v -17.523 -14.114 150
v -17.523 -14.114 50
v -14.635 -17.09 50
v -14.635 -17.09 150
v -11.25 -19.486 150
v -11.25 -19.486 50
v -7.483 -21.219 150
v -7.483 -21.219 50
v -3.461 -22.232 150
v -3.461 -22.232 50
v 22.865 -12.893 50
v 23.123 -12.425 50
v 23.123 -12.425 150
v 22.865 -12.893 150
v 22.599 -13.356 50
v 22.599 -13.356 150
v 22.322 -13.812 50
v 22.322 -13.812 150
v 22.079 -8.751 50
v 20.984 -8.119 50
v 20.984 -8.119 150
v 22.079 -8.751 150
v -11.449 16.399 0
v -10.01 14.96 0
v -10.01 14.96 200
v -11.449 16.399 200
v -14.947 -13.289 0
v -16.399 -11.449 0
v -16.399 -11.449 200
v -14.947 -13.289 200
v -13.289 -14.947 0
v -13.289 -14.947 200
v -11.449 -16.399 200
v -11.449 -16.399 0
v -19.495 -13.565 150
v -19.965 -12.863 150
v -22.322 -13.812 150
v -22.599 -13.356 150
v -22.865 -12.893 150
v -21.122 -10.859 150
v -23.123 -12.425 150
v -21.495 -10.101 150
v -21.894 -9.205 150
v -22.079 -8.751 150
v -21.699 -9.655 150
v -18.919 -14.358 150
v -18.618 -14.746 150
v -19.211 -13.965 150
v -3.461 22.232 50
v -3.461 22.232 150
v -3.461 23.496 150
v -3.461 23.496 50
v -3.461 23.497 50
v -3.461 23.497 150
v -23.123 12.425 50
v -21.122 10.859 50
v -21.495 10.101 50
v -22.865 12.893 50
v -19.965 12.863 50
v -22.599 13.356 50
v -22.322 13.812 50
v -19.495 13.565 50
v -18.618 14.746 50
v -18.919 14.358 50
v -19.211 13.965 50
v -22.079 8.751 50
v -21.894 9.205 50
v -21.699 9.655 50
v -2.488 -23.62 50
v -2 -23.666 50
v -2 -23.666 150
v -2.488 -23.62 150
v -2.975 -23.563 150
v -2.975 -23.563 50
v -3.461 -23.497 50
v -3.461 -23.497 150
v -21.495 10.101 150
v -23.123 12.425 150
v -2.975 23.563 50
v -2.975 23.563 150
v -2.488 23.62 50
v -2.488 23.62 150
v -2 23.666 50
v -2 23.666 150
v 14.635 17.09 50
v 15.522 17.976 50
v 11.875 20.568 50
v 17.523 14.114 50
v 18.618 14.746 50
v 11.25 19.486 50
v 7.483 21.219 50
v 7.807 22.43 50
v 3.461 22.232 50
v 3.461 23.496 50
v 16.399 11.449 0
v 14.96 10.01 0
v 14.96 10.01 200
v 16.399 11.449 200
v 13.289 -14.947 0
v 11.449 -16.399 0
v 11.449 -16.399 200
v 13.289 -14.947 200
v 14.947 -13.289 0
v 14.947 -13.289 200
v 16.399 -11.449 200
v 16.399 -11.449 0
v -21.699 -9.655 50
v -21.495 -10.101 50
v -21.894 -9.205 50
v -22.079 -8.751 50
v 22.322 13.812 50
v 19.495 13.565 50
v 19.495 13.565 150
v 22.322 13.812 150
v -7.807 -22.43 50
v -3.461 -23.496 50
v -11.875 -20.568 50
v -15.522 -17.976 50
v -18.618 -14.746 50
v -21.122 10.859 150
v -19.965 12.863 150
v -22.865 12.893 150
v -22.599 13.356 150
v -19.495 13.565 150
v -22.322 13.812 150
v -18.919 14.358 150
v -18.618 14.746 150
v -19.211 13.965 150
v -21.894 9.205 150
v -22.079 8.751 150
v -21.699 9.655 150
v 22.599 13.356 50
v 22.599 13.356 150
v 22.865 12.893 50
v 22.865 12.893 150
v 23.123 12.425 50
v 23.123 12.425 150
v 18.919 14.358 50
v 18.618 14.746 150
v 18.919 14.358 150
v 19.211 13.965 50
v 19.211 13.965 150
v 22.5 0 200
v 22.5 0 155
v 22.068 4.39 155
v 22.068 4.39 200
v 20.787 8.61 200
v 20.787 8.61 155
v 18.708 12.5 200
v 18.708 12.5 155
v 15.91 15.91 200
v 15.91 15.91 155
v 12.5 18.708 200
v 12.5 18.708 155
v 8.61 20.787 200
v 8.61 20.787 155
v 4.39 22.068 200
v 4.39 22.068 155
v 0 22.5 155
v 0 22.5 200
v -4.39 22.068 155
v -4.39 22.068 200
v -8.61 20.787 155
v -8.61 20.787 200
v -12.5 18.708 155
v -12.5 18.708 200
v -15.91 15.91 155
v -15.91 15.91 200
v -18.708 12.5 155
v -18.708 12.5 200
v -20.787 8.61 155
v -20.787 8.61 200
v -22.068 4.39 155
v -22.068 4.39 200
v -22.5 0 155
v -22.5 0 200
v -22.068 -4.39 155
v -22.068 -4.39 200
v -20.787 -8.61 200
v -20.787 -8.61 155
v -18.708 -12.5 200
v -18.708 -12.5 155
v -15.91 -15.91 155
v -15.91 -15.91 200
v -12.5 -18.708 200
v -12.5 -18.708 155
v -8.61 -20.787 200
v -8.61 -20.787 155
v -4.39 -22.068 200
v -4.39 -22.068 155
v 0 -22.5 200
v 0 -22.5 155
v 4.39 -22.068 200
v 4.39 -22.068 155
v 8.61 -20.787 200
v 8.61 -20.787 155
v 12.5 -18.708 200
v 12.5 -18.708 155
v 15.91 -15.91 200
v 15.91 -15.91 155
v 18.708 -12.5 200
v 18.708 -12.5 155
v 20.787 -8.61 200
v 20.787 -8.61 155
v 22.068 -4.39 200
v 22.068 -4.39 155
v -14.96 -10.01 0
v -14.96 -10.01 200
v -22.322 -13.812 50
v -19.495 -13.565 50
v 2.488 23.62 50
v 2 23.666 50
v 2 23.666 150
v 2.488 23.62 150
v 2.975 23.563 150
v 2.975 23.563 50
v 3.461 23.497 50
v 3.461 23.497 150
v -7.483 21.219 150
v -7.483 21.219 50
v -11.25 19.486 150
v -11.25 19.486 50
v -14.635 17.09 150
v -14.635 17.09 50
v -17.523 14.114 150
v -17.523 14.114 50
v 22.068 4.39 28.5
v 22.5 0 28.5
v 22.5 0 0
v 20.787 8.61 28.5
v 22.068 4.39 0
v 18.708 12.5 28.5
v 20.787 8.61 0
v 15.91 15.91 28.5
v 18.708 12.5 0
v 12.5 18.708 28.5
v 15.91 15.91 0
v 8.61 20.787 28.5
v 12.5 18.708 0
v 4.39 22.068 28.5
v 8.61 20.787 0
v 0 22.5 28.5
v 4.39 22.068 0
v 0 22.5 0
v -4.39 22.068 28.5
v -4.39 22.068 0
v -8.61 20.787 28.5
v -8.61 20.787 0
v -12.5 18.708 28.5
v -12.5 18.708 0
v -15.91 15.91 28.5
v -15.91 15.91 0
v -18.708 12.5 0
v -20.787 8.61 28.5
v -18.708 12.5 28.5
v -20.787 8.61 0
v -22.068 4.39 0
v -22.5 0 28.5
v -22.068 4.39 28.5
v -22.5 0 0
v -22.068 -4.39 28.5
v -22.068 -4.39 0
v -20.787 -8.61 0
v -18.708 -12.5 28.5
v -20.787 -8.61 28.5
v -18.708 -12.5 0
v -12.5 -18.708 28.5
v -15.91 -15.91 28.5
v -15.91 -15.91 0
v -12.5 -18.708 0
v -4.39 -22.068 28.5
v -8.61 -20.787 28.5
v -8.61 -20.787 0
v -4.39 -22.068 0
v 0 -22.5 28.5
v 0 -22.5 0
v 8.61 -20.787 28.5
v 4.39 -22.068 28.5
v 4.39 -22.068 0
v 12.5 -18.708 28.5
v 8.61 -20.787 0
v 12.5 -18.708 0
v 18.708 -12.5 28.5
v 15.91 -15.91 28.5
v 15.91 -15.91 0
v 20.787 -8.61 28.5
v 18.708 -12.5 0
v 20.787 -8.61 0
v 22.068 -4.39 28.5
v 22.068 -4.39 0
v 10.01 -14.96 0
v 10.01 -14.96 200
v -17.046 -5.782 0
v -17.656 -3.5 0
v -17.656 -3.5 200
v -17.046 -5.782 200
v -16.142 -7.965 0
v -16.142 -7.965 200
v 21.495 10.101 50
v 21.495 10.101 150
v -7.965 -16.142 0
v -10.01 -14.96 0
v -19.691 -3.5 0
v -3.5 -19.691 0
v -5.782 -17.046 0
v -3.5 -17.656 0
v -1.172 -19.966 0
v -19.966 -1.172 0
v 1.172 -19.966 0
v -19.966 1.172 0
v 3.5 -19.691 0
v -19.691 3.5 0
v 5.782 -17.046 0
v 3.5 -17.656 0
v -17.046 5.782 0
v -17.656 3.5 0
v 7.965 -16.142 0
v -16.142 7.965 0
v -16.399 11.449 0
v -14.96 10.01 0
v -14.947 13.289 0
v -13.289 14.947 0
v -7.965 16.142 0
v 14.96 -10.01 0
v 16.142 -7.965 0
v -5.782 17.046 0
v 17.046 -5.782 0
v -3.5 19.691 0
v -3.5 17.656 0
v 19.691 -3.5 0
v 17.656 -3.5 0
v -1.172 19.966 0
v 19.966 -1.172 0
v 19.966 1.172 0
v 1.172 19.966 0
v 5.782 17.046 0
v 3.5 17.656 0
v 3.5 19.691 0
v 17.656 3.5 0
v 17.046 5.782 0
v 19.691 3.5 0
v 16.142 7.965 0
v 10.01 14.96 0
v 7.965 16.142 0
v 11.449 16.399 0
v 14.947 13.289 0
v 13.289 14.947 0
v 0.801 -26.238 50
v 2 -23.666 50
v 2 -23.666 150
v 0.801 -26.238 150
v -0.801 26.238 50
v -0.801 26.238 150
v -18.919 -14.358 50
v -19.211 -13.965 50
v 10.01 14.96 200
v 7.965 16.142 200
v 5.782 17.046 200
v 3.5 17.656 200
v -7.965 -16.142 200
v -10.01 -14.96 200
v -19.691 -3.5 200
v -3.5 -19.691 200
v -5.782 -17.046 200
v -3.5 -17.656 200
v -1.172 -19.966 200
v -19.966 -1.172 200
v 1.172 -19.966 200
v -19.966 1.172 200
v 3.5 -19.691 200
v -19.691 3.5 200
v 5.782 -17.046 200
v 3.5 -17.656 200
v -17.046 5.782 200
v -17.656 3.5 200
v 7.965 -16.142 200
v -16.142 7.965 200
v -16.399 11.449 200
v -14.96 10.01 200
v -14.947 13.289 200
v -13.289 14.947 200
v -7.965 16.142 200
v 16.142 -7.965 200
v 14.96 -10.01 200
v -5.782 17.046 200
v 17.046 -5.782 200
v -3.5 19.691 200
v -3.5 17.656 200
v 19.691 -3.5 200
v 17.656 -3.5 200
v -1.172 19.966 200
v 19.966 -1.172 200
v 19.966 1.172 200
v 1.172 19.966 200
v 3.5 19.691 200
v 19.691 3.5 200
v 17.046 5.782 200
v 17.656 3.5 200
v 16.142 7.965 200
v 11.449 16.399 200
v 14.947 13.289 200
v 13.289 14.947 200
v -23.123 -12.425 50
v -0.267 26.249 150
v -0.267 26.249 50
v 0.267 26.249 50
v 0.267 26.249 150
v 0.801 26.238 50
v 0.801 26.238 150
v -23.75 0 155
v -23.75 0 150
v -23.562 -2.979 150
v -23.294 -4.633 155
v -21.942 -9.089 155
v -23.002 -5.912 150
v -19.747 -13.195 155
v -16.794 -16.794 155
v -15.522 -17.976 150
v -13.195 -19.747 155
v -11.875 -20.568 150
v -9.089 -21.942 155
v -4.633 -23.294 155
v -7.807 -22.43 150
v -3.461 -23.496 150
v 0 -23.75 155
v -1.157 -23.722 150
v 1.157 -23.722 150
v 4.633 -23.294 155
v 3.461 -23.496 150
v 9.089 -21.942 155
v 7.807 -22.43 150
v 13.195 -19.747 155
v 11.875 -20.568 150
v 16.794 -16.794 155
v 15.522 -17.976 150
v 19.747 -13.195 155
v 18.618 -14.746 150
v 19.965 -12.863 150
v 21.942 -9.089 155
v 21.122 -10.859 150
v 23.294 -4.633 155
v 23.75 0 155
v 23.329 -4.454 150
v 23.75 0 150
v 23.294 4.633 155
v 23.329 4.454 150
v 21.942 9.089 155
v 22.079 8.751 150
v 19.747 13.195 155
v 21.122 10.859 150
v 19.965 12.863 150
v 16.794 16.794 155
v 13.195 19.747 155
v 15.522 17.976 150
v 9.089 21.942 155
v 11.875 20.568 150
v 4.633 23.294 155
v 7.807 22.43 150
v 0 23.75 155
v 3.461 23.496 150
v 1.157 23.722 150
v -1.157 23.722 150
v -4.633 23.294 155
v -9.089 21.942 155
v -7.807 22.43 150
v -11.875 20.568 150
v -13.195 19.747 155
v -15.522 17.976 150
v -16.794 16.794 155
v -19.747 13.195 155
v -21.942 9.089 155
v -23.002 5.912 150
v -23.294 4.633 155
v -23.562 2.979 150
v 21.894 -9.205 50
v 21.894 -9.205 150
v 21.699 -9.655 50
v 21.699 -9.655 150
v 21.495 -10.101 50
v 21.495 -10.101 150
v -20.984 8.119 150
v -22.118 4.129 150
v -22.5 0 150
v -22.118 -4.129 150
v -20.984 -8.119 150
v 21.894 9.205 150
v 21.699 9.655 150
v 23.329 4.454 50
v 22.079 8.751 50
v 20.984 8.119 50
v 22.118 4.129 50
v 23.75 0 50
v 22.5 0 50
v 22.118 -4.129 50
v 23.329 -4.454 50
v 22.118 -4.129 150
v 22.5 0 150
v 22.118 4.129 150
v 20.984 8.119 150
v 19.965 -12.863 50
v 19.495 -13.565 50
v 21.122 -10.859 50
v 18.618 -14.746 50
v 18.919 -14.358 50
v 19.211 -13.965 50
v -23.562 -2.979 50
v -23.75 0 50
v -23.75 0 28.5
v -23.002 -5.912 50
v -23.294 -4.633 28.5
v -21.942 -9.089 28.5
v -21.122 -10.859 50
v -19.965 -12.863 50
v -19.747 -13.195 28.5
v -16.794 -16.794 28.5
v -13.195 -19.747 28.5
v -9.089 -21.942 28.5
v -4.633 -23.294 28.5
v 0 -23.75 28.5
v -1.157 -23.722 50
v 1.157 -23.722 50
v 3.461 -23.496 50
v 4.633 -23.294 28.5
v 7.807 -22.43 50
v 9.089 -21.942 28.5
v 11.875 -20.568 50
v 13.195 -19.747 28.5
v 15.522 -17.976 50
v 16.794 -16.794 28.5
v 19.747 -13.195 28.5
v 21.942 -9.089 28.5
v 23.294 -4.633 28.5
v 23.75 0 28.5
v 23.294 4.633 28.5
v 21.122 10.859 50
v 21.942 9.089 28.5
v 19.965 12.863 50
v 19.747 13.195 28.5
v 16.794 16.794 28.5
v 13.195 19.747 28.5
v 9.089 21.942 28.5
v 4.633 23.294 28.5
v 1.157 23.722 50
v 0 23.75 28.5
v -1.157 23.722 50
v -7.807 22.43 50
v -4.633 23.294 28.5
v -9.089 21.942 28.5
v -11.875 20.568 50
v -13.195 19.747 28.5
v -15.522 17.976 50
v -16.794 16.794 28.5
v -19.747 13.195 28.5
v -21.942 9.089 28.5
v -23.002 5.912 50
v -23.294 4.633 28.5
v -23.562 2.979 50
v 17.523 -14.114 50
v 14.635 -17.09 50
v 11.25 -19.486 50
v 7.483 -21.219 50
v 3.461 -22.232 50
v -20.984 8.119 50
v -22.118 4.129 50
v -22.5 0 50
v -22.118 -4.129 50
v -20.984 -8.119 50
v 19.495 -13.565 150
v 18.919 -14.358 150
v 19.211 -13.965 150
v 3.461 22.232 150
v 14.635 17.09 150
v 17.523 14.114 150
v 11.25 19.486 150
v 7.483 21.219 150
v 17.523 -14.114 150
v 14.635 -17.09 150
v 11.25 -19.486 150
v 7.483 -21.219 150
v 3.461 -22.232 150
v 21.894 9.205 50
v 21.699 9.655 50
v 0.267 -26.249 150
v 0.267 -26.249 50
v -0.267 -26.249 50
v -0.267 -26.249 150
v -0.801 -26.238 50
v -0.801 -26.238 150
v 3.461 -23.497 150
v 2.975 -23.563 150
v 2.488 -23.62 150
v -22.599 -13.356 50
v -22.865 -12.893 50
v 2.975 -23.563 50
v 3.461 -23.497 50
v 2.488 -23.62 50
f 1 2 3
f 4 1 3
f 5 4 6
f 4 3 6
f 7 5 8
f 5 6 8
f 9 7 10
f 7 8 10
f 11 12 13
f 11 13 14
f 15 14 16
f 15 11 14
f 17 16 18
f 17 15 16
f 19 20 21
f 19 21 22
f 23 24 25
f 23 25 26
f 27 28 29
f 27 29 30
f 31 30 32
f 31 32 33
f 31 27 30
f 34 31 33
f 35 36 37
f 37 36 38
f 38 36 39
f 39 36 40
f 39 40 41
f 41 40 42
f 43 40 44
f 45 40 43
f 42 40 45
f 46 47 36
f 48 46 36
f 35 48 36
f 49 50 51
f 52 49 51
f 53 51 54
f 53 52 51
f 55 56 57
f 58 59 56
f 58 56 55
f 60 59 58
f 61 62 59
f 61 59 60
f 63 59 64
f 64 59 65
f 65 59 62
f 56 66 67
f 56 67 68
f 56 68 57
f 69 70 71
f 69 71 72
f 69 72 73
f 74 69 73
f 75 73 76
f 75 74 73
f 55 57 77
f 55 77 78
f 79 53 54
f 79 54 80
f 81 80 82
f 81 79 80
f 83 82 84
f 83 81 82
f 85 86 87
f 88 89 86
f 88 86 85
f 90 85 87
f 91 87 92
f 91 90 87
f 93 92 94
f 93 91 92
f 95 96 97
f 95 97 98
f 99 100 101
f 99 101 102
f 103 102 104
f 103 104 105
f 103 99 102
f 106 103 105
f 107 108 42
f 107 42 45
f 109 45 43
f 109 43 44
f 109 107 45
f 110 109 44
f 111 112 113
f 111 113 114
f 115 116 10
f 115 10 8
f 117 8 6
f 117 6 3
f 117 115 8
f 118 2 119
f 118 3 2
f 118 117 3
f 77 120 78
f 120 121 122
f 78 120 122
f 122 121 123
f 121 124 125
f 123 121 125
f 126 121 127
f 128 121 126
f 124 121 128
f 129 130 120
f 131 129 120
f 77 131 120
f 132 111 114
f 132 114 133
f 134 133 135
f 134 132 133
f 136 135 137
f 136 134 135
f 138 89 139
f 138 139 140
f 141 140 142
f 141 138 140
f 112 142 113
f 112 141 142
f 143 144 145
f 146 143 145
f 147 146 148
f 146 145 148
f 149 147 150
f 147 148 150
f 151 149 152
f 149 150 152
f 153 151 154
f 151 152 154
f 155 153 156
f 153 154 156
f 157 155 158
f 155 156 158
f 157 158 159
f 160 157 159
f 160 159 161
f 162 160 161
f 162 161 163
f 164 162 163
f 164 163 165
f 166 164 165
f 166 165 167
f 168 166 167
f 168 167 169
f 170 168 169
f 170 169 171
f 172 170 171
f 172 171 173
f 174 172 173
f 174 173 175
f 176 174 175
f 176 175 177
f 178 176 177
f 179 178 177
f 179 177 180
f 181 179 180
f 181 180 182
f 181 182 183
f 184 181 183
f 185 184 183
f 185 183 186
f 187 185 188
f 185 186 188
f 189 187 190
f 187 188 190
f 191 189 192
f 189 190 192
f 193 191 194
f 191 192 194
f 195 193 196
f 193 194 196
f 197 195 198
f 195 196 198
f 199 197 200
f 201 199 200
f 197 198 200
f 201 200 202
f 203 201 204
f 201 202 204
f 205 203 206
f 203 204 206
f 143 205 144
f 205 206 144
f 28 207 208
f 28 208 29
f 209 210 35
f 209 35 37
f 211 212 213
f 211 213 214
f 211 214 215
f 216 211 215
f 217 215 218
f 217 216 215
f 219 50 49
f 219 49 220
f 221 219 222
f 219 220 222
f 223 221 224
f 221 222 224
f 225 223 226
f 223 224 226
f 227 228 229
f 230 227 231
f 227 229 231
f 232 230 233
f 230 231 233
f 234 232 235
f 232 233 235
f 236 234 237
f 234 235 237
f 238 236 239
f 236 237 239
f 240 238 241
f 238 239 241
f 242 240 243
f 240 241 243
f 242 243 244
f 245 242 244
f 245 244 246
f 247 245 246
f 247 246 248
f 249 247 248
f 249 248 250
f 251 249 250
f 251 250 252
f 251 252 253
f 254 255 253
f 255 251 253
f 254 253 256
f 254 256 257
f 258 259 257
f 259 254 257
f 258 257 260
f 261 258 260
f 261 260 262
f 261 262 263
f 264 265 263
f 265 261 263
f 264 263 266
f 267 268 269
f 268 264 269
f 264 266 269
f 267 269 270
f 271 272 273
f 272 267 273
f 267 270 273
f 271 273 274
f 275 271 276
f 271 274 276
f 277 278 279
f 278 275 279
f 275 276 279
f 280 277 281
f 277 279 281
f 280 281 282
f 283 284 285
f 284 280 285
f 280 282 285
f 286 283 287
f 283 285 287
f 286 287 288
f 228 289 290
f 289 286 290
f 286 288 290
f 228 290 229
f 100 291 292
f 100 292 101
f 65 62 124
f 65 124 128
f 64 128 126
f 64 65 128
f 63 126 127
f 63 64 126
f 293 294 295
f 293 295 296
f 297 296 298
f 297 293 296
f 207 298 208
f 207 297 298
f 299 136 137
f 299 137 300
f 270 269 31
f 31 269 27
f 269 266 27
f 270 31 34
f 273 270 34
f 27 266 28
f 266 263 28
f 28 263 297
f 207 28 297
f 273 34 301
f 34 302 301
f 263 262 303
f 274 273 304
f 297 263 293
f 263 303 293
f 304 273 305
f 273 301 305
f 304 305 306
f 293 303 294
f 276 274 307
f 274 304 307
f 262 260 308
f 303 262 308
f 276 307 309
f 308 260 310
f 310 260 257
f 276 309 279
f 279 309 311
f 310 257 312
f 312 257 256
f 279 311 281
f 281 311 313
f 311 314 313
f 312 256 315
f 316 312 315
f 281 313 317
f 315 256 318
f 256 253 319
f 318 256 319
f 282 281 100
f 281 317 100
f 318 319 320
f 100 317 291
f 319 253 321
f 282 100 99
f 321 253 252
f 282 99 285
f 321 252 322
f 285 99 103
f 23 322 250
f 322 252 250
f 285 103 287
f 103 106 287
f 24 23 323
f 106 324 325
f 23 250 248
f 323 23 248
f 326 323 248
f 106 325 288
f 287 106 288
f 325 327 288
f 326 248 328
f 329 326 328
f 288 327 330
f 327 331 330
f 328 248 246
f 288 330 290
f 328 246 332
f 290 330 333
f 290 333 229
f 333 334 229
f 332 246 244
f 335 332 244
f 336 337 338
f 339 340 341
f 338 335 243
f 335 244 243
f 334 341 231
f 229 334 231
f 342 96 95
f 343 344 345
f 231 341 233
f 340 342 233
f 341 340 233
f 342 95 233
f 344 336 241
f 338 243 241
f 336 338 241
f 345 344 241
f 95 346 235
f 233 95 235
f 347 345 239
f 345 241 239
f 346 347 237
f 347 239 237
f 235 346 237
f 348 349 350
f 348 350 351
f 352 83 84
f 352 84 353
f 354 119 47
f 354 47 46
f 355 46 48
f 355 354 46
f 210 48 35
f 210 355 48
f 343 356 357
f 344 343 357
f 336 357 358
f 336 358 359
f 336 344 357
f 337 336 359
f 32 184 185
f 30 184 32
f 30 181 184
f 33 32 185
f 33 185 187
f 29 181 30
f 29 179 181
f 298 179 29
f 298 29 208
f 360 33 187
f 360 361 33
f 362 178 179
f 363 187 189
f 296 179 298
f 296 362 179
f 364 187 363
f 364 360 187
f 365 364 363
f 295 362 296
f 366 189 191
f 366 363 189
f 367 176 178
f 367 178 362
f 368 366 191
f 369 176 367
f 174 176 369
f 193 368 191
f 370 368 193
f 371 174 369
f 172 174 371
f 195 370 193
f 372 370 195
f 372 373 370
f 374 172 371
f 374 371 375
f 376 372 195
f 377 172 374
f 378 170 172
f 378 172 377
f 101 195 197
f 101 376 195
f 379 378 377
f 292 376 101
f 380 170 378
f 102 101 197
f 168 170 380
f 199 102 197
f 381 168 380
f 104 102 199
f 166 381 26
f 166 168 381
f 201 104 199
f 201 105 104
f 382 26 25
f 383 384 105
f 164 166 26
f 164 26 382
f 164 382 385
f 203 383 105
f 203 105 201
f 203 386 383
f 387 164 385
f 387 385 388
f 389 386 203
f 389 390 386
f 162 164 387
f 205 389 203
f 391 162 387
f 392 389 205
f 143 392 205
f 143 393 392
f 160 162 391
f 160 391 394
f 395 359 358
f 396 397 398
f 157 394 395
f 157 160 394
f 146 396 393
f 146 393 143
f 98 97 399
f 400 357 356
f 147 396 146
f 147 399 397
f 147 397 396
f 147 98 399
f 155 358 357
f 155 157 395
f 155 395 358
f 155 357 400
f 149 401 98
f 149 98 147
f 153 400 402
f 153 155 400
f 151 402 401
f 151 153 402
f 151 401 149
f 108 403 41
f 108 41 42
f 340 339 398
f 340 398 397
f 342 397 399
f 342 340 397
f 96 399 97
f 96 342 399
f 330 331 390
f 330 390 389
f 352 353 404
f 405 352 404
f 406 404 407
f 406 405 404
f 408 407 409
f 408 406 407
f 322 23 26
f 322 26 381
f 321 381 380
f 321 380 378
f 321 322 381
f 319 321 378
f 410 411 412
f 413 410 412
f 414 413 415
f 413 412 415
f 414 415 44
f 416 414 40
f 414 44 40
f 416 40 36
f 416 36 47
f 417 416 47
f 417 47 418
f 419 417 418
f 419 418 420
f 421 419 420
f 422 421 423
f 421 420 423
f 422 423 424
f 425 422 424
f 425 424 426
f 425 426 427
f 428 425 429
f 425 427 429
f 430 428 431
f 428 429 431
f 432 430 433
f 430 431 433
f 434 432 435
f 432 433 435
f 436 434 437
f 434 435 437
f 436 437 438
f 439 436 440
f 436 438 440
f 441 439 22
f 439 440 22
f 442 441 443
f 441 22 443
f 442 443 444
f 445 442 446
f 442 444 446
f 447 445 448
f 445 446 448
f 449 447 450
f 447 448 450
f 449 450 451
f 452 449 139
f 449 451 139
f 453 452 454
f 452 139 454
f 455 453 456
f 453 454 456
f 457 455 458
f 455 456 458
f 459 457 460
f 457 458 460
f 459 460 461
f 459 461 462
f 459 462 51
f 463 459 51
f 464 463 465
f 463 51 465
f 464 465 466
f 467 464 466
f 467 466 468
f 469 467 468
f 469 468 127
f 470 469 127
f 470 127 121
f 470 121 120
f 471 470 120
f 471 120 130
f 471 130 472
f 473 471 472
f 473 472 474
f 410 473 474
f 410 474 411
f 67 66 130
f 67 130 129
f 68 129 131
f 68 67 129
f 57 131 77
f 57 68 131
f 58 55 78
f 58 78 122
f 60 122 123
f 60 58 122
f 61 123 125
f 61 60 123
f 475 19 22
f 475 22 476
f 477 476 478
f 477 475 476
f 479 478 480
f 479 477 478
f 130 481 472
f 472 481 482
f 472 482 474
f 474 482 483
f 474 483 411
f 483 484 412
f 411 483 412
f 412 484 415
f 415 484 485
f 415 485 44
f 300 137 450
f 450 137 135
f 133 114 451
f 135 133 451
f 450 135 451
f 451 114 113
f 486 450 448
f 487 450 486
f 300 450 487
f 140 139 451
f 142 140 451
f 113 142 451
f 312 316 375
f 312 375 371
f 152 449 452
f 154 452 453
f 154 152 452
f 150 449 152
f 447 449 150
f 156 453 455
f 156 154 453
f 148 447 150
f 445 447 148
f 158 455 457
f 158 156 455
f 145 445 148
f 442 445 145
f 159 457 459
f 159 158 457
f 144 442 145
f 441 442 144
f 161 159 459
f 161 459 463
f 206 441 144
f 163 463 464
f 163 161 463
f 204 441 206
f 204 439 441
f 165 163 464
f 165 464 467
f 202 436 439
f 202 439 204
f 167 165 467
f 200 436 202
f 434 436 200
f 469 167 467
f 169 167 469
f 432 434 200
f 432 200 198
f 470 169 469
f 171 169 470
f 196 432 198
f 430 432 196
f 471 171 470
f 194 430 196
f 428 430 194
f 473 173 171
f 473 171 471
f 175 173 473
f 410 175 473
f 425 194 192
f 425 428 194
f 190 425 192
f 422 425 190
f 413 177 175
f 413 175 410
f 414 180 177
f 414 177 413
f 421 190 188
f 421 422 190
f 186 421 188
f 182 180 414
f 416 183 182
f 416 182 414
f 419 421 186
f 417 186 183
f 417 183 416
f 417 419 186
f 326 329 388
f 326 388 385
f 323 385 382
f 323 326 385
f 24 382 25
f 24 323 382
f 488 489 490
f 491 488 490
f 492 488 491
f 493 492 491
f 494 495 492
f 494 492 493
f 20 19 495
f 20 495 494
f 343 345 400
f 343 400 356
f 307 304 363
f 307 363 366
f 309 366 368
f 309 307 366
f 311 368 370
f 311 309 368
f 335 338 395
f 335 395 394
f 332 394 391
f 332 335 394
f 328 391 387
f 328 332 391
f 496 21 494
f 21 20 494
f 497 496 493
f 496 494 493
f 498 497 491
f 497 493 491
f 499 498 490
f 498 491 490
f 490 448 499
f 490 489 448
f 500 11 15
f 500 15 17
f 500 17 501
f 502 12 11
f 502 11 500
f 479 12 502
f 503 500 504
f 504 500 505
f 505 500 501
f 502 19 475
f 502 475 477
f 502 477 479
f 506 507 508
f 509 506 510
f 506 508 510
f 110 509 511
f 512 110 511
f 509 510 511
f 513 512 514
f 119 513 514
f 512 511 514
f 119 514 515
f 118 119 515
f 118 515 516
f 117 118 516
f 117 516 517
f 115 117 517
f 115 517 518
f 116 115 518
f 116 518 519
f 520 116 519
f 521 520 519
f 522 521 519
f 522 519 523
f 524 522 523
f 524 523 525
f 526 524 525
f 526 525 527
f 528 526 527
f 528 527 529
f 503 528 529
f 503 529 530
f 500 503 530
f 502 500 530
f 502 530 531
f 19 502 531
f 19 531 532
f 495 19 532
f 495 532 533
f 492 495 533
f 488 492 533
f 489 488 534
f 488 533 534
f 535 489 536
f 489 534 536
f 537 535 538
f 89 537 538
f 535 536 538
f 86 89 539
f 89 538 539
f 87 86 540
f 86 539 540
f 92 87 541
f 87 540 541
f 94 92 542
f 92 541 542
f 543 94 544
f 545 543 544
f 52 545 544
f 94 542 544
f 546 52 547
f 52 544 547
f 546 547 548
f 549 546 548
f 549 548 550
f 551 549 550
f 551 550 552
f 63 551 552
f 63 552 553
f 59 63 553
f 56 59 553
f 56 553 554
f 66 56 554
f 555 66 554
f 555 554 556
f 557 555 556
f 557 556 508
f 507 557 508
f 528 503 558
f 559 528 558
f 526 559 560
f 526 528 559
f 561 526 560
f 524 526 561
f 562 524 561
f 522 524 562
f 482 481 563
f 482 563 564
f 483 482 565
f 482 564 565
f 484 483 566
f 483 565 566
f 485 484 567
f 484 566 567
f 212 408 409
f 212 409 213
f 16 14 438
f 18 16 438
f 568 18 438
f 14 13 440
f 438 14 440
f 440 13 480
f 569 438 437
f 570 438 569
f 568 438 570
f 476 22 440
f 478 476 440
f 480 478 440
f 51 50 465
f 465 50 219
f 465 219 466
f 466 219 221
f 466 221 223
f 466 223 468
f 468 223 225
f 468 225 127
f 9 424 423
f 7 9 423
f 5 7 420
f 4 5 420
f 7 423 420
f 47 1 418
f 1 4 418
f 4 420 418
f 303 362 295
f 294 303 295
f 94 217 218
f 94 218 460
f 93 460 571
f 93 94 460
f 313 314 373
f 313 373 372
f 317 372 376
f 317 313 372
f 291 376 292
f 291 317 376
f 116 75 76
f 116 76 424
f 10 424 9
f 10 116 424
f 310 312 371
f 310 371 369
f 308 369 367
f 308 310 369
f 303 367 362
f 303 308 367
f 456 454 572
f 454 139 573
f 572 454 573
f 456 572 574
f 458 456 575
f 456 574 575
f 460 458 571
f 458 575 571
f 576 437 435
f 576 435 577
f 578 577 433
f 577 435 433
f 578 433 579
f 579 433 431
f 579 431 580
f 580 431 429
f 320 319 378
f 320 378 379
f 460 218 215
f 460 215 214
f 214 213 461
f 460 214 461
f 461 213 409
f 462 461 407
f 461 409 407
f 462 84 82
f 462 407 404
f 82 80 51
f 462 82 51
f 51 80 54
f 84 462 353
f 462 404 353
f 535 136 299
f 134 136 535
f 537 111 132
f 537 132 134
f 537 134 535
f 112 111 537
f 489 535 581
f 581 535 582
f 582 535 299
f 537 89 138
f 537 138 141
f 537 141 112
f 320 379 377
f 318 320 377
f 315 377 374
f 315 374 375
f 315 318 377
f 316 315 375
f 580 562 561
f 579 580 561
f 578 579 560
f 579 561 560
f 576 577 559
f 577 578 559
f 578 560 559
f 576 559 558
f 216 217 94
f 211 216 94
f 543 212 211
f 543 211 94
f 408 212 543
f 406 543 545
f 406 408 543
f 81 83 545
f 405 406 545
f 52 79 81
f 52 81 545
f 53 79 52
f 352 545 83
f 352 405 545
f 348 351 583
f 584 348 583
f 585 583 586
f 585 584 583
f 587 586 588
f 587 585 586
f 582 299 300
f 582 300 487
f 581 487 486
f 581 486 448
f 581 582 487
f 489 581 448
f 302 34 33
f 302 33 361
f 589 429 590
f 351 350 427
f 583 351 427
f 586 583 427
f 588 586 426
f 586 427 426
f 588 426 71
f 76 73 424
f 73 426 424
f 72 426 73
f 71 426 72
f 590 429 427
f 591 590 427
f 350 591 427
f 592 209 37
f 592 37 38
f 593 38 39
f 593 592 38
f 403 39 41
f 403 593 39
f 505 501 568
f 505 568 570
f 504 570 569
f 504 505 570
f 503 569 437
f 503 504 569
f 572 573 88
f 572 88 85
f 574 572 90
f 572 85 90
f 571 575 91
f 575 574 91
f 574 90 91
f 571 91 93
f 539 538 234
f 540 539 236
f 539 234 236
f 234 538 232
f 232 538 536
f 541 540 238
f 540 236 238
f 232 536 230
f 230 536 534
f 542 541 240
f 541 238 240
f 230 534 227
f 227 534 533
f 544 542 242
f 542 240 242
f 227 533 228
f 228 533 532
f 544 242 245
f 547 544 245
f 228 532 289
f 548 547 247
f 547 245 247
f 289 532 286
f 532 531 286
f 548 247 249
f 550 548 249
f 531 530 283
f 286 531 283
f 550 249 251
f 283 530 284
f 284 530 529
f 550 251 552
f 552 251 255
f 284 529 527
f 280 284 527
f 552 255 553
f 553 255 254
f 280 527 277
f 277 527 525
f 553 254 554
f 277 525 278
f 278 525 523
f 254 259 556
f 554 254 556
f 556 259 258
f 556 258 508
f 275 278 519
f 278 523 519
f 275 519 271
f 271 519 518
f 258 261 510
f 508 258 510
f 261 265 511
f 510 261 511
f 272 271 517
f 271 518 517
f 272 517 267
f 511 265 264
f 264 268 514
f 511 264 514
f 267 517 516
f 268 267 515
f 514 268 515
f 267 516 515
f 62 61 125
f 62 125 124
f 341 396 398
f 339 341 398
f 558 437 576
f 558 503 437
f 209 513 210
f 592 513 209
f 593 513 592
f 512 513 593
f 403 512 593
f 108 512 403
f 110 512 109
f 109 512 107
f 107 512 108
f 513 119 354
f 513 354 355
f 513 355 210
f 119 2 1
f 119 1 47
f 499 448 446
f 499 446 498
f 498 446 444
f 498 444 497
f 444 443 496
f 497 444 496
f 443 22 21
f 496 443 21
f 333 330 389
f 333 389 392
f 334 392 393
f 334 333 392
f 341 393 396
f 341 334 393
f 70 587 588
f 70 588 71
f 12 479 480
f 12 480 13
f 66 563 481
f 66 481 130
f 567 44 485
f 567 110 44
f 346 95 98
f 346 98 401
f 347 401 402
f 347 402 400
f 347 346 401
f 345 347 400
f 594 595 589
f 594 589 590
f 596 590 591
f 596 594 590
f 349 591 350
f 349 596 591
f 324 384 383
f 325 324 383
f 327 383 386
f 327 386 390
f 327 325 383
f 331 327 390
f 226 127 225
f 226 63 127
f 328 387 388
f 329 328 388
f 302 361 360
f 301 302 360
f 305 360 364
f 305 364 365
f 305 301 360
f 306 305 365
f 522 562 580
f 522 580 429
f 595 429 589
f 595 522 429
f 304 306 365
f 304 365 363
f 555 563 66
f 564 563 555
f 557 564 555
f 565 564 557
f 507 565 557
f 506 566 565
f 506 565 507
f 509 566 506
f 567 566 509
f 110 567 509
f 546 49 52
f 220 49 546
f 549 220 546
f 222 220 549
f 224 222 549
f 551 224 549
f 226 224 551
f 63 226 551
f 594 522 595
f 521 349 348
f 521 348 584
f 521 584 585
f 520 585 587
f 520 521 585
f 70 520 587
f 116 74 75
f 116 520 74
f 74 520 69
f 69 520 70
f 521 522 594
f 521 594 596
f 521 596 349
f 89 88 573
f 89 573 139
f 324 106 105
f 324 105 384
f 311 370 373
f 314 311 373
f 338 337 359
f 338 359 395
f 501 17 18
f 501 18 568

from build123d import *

# Parameters (mm, degrees)
SKETCH1_R           = 22.5
BOSS_EXTRUDE1_DEPTH = 200
BOSS_EXTRUDE2_START = 50
BOSS_EXTRUDE2_DEPTH = 100
BOSS_EXTRUDE3_START = -50
SKETCH4_R           = 23.75
SKETCH4_R_2         = 22.25
BOSS_EXTRUDE3_DEPTH = 5
BOSS_EXTRUDE4_START = -171.5
SKETCH4_2_R         = 23.75
SKETCH4_2_R_2       = 22.25
BOSS_EXTRUDE4_DEPTH = 21.5


with BuildPart() as part:
    # Sketch1 → Boss-Extrude1 (new body)
    with BuildSketch(Plane.XY):
        Circle(SKETCH1_R)
        with BuildLine():
            Line((-3.5, 19.691368668), (-3.5, 17.656443583))
            ThreePointArc((-3.5, 17.656443583), (-6.888301783, 16.629831585), (-10.010117255, 14.959864723))
            Line((-10.010117255, 14.959864723), (-11.449026581, 16.39877405))
            ThreePointArc((-11.449026581, 16.39877405), (-14.142135624, 14.142135624), (-16.39877405, 11.449026581))
            Line((-16.39877405, 11.449026581), (-14.959864723, 10.010117255))
            ThreePointArc((-14.959864723, 10.010117255), (-16.629831585, 6.888301783), (-17.656443583, 3.5))
            Line((-17.656443583, 3.5), (-19.691368668, 3.5))
            ThreePointArc((-19.691368668, 3.5), (-20, 0), (-19.691368668, -3.5))
            Line((-19.691368668, -3.5), (-17.656443583, -3.5))
            ThreePointArc((-17.656443583, -3.5), (-16.629831585, -6.888301783), (-14.959864723, -10.010117255))
            Line((-14.959864723, -10.010117255), (-16.39877405, -11.449026581))
            ThreePointArc((-16.39877405, -11.449026581), (-14.142135624, -14.142135624), (-11.449026581, -16.39877405))
            Line((-11.449026581, -16.39877405), (-10.010117255, -14.959864723))
            ThreePointArc((-10.010117255, -14.959864723), (-6.888301783, -16.629831585), (-3.5, -17.656443583))
            Line((-3.5, -17.656443583), (-3.5, -19.691368668))
            ThreePointArc((-3.5, -19.691368668), (0, -20), (3.5, -19.691368668))
            Line((3.5, -19.691368668), (3.5, -17.656443583))
            ThreePointArc((3.5, -17.656443583), (6.888301783, -16.629831585), (10.010117255, -14.959864723))
            Line((10.010117255, -14.959864723), (11.449026581, -16.39877405))
            ThreePointArc((11.449026581, -16.39877405), (14.142135624, -14.142135624), (16.39877405, -11.449026581))
            Line((16.39877405, -11.449026581), (14.959864723, -10.010117255))
            ThreePointArc((14.959864723, -10.010117255), (16.629831585, -6.888301783), (17.656443583, -3.5))
            Line((17.656443583, -3.5), (19.691368668, -3.5))
            ThreePointArc((19.691368668, -3.5), (20, 0), (19.691368668, 3.5))
            Line((19.691368668, 3.5), (17.656443583, 3.5))
            ThreePointArc((17.656443583, 3.5), (16.629831585, 6.888301783), (14.959864723, 10.010117255))
            Line((14.959864723, 10.010117255), (16.39877405, 11.449026581))
            ThreePointArc((16.39877405, 11.449026581), (14.142135624, 14.142135624), (11.449026581, 16.39877405))
            Line((11.449026581, 16.39877405), (10.010117255, 14.959864723))
            ThreePointArc((10.010117255, 14.959864723), (6.888301783, 16.629831585), (3.5, 17.656443583))
            Line((3.5, 17.656443583), (3.5, 19.691368668))
            ThreePointArc((3.5, 19.691368668), (0, 20), (-3.5, 19.691368668))
        make_face(mode=Mode.SUBTRACT)
    extrude(amount=BOSS_EXTRUDE1_DEPTH)

    # Sketch3 → Boss-Extrude2 (add)
    with BuildSketch(Plane.XY.offset(BOSS_EXTRUDE2_START)):
        with BuildLine():
            Line((-2.000027302, 23.665962711), (-0.80077241, 26.237773126))
            ThreePointArc((-0.80077241, 26.237773126), (0, 26.249990002), (0.80077241, 26.237773126))
            Line((0.80077241, 26.237773126), (2.000027302, 23.665962711))
            ThreePointArc((2.000027302, 23.665962711), (2.731879206, 23.592683956), (3.461111111, 23.496778718))
            Line((3.461111111, 23.496778718), (3.461111111, 21.979153985))
            ThreePointArc((3.461111111, 21.979153985), (0, 22.25), (-3.461111111, 21.979153985))
            Line((-3.461111111, 21.979153985), (-3.461111111, 23.496778718))
            ThreePointArc((-3.461111111, 23.496778718), (-2.731879206, 23.592683956), (-2.000027302, 23.665962711))
        make_face()
        with BuildLine():
            Line((17.303950149, 13.98698714), (18.618251721, 14.745799506))
            ThreePointArc((18.618251721, 14.745799506), (19.065924046, 14.162218771), (19.495311261, 13.565055807))
            Line((19.495311261, 13.565055807), (22.322191861, 13.812375813))
            ThreePointArc((22.322191861, 13.812375813), (22.73315819, 13.124995001), (23.122964271, 12.425397313))
            Line((23.122964271, 12.425397313), (21.495338563, 10.100906903))
            ThreePointArc((21.495338563, 10.100906903), (21.797803252, 9.430465185), (22.079362832, 8.750979211))
            Line((22.079362832, 8.750979211), (20.76506126, 7.992166845))
            ThreePointArc((20.76506126, 7.992166845), (19.269065234, 11.125), (17.303950149, 13.98698714))
        make_face()
        with BuildLine():
            Line((20.76506126, -7.992166845), (22.079362832, -8.750979211))
            ThreePointArc((22.079362832, -8.750979211), (21.797803252, -9.430465185), (21.495338563, -10.100906903))
            Line((21.495338563, -10.100906903), (23.122964271, -12.425397313))
            ThreePointArc((23.122964271, -12.425397313), (22.73315819, -13.124995001), (22.322191861, -13.812375813))
            Line((22.322191861, -13.812375813), (19.495311261, -13.565055807))
            ThreePointArc((19.495311261, -13.565055807), (19.065924046, -14.162218771), (18.618251721, -14.745799506))
            Line((18.618251721, -14.745799506), (17.303950149, -13.98698714))
            ThreePointArc((17.303950149, -13.98698714), (19.269065234, -11.125), (20.76506126, -7.992166845))
        make_face()
        with BuildLine():
            Line((3.461111111, -21.979153985), (3.461111111, -23.496778718))
            ThreePointArc((3.461111111, -23.496778718), (2.731879206, -23.592683956), (2.000027302, -23.665962711))
            Line((2.000027302, -23.665962711), (0.80077241, -26.237773126))
            ThreePointArc((0.80077241, -26.237773126), (0, -26.249990002), (-0.80077241, -26.237773126))
            Line((-0.80077241, -26.237773126), (-2.000027302, -23.665962711))
            ThreePointArc((-2.000027302, -23.665962711), (-2.731879206, -23.592683956), (-3.461111111, -23.496778718))
            Line((-3.461111111, -23.496778718), (-3.461111111, -21.979153985))
            ThreePointArc((-3.461111111, -21.979153985), (0, -22.25), (3.461111111, -21.979153985))
        make_face()
        with BuildLine():
            Line((-17.303950149, -13.98698714), (-18.618251721, -14.745799506))
            ThreePointArc((-18.618251721, -14.745799506), (-19.065924046, -14.162218771), (-19.495311261, -13.565055807))
            Line((-19.495311261, -13.565055807), (-22.322191861, -13.812375813))
            ThreePointArc((-22.322191861, -13.812375813), (-22.73315819, -13.124995001), (-23.122964271, -12.425397313))
            Line((-23.122964271, -12.425397313), (-21.495338563, -10.100906903))
            ThreePointArc((-21.495338563, -10.100906903), (-21.797803252, -9.430465185), (-22.079362832, -8.750979211))
            Line((-22.079362832, -8.750979211), (-20.76506126, -7.992166845))
            ThreePointArc((-20.76506126, -7.992166845), (-19.269065234, -11.125), (-17.303950149, -13.98698714))
        make_face()
        with BuildLine():
            Line((-20.76506126, 7.992166845), (-22.079362832, 8.750979211))
            ThreePointArc((-22.079362832, 8.750979211), (-21.797803252, 9.430465185), (-21.495338563, 10.100906903))
            Line((-21.495338563, 10.100906903), (-23.122964271, 12.425397313))
            ThreePointArc((-23.122964271, 12.425397313), (-22.73315819, 13.124995001), (-22.322191861, 13.812375813))
            Line((-22.322191861, 13.812375813), (-19.495311261, 13.565055807))
            ThreePointArc((-19.495311261, 13.565055807), (-19.065924046, 14.162218771), (-18.618251721, 14.745799506))
            Line((-18.618251721, 14.745799506), (-17.303950149, 13.98698714))
            ThreePointArc((-17.303950149, 13.98698714), (-19.269065234, 11.125), (-20.76506126, 7.992166845))
        make_face()
    extrude(amount=BOSS_EXTRUDE2_DEPTH)

    # Sketch4 → Boss-Extrude3 (add)
    with BuildSketch(Plane.XY.offset(200).offset(BOSS_EXTRUDE3_START)):
        with Locations(Location((0, 0, 0), (0, 0, 180))):
            Circle(SKETCH4_R)
        Circle(SKETCH4_R_2, mode=Mode.SUBTRACT)
    extrude(amount=BOSS_EXTRUDE3_DEPTH)

    # Sketch4<2> → Boss-Extrude4 (add)
    with BuildSketch(Plane.XY.offset(200).offset(BOSS_EXTRUDE4_START)):
        with Locations(Location((0, 0, 0), (0, 0, 180))):
            Circle(SKETCH4_2_R)
        Circle(SKETCH4_2_R_2, mode=Mode.SUBTRACT)
    extrude(amount=BOSS_EXTRUDE4_DEPTH)


solid = part.part
